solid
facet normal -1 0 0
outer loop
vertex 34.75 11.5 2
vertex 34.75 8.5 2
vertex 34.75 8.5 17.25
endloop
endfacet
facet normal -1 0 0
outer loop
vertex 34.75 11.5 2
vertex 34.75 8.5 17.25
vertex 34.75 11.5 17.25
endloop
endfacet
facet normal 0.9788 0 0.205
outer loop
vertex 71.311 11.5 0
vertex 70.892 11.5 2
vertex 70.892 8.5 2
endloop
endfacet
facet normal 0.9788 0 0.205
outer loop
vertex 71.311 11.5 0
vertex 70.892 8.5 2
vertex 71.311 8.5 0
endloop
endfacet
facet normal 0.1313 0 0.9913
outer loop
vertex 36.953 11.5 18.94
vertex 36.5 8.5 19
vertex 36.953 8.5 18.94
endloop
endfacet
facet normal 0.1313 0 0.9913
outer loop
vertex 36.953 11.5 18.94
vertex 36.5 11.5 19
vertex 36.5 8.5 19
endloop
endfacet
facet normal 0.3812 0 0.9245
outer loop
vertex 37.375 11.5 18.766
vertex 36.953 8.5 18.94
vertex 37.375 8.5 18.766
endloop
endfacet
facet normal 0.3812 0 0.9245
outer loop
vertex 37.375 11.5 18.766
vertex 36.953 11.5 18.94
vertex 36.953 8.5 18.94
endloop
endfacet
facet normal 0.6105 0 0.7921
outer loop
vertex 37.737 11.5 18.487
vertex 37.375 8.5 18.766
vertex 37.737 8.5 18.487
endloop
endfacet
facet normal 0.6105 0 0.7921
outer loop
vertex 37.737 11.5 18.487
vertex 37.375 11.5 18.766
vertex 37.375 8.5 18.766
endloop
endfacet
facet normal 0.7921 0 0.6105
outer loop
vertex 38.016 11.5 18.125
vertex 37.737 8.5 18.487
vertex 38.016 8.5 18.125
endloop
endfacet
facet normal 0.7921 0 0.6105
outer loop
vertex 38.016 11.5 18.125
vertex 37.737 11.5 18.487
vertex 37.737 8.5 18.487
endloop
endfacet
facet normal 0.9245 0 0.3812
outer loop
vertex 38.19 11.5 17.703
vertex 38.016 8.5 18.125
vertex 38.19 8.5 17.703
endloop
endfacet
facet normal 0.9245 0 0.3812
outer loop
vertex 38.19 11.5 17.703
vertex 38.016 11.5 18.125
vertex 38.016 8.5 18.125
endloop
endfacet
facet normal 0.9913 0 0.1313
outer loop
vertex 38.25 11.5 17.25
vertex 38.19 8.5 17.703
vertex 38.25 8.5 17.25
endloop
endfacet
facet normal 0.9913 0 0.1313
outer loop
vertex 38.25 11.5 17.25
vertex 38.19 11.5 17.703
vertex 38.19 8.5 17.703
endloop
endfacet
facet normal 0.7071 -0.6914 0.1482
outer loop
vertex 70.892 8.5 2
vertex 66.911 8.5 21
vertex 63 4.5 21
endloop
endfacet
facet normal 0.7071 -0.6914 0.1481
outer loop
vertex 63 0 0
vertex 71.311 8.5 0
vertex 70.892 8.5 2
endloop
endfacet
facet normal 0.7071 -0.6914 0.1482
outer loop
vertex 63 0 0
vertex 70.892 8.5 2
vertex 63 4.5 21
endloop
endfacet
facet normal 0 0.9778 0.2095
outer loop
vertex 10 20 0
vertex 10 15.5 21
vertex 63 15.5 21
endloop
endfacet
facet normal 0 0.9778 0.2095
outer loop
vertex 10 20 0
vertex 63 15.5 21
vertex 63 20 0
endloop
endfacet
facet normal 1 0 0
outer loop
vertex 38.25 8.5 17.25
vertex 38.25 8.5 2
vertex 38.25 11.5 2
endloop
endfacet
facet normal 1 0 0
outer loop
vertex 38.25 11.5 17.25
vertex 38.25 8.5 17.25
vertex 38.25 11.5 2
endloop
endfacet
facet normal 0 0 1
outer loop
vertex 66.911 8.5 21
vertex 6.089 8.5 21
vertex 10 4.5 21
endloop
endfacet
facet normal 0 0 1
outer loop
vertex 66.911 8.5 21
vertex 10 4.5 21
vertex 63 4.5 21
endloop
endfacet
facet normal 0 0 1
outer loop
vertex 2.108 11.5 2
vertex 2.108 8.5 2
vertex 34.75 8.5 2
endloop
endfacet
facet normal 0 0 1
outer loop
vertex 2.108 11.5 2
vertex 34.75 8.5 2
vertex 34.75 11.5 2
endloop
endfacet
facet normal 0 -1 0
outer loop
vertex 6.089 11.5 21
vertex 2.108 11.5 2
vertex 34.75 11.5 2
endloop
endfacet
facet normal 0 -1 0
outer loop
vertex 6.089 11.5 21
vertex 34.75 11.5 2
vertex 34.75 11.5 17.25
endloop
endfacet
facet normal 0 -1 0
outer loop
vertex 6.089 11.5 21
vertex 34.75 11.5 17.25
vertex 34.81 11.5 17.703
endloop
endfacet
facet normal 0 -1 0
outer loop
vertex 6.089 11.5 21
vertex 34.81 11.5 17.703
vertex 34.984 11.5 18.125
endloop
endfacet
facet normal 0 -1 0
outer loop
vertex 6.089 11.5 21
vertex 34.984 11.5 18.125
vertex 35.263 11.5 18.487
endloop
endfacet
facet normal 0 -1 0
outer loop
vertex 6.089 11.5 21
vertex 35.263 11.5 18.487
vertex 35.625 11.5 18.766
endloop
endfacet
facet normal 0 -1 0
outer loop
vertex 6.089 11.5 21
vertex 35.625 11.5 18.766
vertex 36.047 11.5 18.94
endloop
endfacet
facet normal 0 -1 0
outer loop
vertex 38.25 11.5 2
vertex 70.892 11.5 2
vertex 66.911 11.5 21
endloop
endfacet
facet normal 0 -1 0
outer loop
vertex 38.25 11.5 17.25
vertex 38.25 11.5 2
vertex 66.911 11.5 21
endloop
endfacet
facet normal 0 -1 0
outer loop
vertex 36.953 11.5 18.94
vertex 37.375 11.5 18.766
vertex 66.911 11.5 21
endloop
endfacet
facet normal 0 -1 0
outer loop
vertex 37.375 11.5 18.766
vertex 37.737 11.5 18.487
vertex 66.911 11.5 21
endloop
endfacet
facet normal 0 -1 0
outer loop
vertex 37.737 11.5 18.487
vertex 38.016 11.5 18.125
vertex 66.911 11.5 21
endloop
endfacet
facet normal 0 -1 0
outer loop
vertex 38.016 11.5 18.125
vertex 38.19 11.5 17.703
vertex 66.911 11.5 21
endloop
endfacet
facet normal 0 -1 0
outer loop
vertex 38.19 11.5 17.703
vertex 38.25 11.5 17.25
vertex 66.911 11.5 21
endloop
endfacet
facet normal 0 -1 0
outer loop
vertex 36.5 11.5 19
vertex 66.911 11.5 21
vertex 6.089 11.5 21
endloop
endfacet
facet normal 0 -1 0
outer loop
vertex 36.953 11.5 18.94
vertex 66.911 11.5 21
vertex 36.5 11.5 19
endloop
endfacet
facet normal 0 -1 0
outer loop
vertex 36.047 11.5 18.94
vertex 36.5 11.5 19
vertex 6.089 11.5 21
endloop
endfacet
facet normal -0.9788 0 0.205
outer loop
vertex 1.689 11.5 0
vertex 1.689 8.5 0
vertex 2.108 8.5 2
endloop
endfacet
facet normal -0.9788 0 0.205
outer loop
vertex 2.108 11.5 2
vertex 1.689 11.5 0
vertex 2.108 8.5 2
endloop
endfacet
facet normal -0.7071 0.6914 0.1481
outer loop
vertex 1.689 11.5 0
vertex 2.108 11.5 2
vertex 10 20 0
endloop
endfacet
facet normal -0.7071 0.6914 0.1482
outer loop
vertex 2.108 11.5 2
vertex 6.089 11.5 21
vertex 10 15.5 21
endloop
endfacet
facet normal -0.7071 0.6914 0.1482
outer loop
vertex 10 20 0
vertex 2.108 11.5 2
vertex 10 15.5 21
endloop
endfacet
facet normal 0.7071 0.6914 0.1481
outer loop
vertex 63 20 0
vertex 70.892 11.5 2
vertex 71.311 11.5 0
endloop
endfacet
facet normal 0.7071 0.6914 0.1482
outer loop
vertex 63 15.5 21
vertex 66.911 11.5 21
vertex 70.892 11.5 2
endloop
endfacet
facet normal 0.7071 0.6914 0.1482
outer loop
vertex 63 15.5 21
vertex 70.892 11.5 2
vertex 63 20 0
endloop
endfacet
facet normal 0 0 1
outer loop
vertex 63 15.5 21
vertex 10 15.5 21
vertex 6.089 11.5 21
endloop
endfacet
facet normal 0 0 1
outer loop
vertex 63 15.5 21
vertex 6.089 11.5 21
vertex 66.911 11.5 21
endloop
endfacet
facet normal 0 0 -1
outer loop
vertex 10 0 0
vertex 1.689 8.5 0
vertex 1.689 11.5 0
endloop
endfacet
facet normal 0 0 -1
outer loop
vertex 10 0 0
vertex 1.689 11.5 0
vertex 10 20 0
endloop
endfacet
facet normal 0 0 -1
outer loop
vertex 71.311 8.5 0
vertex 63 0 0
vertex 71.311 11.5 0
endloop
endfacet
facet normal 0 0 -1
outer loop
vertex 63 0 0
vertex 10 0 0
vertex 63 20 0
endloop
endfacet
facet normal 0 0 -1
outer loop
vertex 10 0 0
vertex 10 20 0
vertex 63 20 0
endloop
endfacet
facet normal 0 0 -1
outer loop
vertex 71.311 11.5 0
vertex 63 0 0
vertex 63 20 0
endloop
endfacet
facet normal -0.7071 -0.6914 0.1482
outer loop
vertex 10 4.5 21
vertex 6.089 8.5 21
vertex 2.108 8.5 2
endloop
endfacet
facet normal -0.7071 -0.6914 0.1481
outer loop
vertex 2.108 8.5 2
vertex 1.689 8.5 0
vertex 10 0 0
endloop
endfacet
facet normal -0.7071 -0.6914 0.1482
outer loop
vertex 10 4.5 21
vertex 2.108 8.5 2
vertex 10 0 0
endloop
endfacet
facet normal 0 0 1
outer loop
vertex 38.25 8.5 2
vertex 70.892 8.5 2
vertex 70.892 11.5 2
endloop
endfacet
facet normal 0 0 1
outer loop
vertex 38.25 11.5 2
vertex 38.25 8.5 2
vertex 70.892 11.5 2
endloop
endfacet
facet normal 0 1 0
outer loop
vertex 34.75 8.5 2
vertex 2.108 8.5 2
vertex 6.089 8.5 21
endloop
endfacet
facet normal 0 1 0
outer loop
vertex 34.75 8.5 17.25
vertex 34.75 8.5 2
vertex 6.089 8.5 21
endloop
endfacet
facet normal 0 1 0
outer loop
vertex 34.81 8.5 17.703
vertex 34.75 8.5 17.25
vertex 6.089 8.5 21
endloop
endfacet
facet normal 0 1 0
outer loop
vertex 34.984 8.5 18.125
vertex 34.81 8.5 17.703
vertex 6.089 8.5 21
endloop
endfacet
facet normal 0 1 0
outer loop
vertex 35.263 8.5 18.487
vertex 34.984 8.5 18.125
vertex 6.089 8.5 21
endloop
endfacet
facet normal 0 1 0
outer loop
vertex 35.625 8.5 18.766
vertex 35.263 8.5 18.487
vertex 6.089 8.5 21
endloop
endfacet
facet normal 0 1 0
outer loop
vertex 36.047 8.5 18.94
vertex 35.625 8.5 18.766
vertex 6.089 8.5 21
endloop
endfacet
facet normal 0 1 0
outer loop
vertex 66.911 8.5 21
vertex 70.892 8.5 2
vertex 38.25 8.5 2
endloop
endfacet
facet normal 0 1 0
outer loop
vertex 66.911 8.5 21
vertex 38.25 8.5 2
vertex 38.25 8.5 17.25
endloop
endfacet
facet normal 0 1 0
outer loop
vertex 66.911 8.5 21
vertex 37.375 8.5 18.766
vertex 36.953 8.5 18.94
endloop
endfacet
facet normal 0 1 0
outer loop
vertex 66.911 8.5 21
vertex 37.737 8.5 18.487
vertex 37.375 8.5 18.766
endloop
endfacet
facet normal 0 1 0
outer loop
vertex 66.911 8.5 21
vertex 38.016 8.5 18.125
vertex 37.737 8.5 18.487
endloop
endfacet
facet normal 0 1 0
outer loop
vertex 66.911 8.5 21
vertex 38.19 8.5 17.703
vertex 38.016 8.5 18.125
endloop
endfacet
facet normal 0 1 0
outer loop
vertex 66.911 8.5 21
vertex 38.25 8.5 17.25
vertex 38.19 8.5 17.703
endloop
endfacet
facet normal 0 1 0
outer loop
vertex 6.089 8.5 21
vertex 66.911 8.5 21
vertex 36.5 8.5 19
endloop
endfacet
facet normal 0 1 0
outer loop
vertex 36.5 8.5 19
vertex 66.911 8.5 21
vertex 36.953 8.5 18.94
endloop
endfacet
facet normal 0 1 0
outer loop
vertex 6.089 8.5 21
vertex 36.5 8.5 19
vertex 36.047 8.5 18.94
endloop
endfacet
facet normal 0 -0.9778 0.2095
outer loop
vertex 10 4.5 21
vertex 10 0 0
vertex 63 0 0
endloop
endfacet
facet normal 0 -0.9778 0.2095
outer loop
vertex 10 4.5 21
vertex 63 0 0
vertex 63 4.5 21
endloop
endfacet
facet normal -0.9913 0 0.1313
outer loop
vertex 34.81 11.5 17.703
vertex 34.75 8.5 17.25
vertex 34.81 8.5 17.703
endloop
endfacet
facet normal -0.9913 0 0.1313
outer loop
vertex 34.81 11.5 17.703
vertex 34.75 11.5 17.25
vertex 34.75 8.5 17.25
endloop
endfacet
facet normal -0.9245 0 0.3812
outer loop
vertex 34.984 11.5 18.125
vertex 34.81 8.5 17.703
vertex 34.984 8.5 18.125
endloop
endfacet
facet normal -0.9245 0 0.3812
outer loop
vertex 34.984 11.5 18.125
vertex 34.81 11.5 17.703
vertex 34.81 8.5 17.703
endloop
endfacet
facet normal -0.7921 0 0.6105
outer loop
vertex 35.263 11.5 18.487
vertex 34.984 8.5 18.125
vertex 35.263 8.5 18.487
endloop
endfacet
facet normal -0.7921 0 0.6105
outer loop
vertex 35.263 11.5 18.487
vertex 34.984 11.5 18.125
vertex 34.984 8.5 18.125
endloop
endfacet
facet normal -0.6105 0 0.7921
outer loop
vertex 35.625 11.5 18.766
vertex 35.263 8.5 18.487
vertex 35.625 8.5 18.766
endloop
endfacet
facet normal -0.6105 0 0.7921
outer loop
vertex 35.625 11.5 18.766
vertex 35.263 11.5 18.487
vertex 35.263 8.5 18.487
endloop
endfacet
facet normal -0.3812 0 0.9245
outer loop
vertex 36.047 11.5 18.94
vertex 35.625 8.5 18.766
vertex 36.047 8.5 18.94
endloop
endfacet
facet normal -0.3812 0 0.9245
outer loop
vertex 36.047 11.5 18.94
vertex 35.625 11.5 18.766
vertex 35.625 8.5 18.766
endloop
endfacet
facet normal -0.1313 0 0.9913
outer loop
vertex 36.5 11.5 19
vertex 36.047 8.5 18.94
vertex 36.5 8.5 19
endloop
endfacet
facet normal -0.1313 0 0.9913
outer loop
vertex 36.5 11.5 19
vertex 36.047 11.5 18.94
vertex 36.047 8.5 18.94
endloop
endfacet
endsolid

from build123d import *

# Parameters (mm, degrees)
F0_W        = 73
F0_H        = 20
F1_DEPTH    = 21
F2_W        = 3
F2_H        = 19
F3_DEPTH    = 73.001
F4_W        = 1.75
F4_H        = 3
F5_DEPTH    = 17
F6_R        = 1.74999
F7_T1_DEPTH = 72.9103913542
F7_T3_DEPTH = 72.9103913542
F9_DEPTH    = 20.001


# Not quite as in the source:
# - a fillet or chamfer that OpenCascade refuses, or shapes differently, is made with other operations: its cross-section is extruded or revolved along the edge and cut away or added
# - a fillet or chamfer is up to 0.001 mm smaller than in the source, because OpenCascade refuses the exact size


with BuildPart() as f1:
    # F0 (on Top) → F1 (new body)
    with BuildSketch(Plane.XY):
        with Locations((36.5, 10)):
            Rectangle(F0_W, F0_H)
    extrude(amount=F1_DEPTH)

    # F2 (on face) → F3 (cut, through all)
    with BuildSketch(Plane.YZ.offset(73)):
        Polygon((20, 21), (15.5, 21), (20, 0), align=None)
        with Locations((10, 11.5)):
            Rectangle(F2_W, F2_H)
        Polygon((4.5, 21), (0, 21), (0, 0), align=None)
    extrude(amount=-F3_DEPTH, mode=Mode.SUBTRACT)

    # F4 (on face) → F5 (join)
    with BuildSketch(Plane.XY.offset(2)):
        with Locations((35.625, 10)):
            Rectangle(F4_W, F4_H)
        with Locations((37.375, 10)):
            Rectangle(F4_W, F4_H)
    extrude(amount=F5_DEPTH)

    # F6 (radius 1.75 in the source; OpenCascade refuses exactly that, so slightly less here)
    f6_edges = [f1.edges().sort_by_distance(p)[0] for p in [
        (38.25, 10, 19),
        (34.75, 10, 19),
    ]]
    fillet(f6_edges, radius=F6_R)

    # F7: chamfer of 10 on 4 edges, made by hand

    # F7_s2 → F7_t1 (cut)
    with BuildSketch(Plane(origin=(0, -9.0103751492, 42.0484173631), x_dir=(1, 0, 0), z_dir=(0, 0.2095290887, -0.9778024141))):
        Polygon((73, -9.5560482815), (63, -19.5560482815), (73, -19.5560482815), align=None)
        Polygon((0, -9.5560482815), (10, -19.5560482815), (0, -19.5560482815), align=None)
    extrude(amount=F7_T1_DEPTH, mode=Mode.SUBTRACT)

    # F7_s4 → F7_t3 (cut)
    with BuildSketch(Plane(origin=(0, -5.3884239297, -25.1459783387), x_dir=(1, 0, 0), z_dir=(0, 0.2095290887, 0.9778024141))):
        Polygon((73, 10), (63, 0), (73, 0), align=None)
        Polygon((0, 10), (10, 0), (0, 0), align=None)
    extrude(amount=F7_T3_DEPTH, mode=Mode.SUBTRACT)

    # F8 (on Front) → F9 (cut, through all)
    with BuildSketch(Plane.XZ):
        Polygon((1.6886794803, 0), (6.0887903437, 21), (0, 21), (0, 0), align=None)
        Polygon((72.7780241408, 21), (66.9112096563, 21), (71.3113205197, 0), (72.7780241408, 0), align=None)
    extrude(amount=-F9_DEPTH, mode=Mode.SUBTRACT)


solid = f1.part
